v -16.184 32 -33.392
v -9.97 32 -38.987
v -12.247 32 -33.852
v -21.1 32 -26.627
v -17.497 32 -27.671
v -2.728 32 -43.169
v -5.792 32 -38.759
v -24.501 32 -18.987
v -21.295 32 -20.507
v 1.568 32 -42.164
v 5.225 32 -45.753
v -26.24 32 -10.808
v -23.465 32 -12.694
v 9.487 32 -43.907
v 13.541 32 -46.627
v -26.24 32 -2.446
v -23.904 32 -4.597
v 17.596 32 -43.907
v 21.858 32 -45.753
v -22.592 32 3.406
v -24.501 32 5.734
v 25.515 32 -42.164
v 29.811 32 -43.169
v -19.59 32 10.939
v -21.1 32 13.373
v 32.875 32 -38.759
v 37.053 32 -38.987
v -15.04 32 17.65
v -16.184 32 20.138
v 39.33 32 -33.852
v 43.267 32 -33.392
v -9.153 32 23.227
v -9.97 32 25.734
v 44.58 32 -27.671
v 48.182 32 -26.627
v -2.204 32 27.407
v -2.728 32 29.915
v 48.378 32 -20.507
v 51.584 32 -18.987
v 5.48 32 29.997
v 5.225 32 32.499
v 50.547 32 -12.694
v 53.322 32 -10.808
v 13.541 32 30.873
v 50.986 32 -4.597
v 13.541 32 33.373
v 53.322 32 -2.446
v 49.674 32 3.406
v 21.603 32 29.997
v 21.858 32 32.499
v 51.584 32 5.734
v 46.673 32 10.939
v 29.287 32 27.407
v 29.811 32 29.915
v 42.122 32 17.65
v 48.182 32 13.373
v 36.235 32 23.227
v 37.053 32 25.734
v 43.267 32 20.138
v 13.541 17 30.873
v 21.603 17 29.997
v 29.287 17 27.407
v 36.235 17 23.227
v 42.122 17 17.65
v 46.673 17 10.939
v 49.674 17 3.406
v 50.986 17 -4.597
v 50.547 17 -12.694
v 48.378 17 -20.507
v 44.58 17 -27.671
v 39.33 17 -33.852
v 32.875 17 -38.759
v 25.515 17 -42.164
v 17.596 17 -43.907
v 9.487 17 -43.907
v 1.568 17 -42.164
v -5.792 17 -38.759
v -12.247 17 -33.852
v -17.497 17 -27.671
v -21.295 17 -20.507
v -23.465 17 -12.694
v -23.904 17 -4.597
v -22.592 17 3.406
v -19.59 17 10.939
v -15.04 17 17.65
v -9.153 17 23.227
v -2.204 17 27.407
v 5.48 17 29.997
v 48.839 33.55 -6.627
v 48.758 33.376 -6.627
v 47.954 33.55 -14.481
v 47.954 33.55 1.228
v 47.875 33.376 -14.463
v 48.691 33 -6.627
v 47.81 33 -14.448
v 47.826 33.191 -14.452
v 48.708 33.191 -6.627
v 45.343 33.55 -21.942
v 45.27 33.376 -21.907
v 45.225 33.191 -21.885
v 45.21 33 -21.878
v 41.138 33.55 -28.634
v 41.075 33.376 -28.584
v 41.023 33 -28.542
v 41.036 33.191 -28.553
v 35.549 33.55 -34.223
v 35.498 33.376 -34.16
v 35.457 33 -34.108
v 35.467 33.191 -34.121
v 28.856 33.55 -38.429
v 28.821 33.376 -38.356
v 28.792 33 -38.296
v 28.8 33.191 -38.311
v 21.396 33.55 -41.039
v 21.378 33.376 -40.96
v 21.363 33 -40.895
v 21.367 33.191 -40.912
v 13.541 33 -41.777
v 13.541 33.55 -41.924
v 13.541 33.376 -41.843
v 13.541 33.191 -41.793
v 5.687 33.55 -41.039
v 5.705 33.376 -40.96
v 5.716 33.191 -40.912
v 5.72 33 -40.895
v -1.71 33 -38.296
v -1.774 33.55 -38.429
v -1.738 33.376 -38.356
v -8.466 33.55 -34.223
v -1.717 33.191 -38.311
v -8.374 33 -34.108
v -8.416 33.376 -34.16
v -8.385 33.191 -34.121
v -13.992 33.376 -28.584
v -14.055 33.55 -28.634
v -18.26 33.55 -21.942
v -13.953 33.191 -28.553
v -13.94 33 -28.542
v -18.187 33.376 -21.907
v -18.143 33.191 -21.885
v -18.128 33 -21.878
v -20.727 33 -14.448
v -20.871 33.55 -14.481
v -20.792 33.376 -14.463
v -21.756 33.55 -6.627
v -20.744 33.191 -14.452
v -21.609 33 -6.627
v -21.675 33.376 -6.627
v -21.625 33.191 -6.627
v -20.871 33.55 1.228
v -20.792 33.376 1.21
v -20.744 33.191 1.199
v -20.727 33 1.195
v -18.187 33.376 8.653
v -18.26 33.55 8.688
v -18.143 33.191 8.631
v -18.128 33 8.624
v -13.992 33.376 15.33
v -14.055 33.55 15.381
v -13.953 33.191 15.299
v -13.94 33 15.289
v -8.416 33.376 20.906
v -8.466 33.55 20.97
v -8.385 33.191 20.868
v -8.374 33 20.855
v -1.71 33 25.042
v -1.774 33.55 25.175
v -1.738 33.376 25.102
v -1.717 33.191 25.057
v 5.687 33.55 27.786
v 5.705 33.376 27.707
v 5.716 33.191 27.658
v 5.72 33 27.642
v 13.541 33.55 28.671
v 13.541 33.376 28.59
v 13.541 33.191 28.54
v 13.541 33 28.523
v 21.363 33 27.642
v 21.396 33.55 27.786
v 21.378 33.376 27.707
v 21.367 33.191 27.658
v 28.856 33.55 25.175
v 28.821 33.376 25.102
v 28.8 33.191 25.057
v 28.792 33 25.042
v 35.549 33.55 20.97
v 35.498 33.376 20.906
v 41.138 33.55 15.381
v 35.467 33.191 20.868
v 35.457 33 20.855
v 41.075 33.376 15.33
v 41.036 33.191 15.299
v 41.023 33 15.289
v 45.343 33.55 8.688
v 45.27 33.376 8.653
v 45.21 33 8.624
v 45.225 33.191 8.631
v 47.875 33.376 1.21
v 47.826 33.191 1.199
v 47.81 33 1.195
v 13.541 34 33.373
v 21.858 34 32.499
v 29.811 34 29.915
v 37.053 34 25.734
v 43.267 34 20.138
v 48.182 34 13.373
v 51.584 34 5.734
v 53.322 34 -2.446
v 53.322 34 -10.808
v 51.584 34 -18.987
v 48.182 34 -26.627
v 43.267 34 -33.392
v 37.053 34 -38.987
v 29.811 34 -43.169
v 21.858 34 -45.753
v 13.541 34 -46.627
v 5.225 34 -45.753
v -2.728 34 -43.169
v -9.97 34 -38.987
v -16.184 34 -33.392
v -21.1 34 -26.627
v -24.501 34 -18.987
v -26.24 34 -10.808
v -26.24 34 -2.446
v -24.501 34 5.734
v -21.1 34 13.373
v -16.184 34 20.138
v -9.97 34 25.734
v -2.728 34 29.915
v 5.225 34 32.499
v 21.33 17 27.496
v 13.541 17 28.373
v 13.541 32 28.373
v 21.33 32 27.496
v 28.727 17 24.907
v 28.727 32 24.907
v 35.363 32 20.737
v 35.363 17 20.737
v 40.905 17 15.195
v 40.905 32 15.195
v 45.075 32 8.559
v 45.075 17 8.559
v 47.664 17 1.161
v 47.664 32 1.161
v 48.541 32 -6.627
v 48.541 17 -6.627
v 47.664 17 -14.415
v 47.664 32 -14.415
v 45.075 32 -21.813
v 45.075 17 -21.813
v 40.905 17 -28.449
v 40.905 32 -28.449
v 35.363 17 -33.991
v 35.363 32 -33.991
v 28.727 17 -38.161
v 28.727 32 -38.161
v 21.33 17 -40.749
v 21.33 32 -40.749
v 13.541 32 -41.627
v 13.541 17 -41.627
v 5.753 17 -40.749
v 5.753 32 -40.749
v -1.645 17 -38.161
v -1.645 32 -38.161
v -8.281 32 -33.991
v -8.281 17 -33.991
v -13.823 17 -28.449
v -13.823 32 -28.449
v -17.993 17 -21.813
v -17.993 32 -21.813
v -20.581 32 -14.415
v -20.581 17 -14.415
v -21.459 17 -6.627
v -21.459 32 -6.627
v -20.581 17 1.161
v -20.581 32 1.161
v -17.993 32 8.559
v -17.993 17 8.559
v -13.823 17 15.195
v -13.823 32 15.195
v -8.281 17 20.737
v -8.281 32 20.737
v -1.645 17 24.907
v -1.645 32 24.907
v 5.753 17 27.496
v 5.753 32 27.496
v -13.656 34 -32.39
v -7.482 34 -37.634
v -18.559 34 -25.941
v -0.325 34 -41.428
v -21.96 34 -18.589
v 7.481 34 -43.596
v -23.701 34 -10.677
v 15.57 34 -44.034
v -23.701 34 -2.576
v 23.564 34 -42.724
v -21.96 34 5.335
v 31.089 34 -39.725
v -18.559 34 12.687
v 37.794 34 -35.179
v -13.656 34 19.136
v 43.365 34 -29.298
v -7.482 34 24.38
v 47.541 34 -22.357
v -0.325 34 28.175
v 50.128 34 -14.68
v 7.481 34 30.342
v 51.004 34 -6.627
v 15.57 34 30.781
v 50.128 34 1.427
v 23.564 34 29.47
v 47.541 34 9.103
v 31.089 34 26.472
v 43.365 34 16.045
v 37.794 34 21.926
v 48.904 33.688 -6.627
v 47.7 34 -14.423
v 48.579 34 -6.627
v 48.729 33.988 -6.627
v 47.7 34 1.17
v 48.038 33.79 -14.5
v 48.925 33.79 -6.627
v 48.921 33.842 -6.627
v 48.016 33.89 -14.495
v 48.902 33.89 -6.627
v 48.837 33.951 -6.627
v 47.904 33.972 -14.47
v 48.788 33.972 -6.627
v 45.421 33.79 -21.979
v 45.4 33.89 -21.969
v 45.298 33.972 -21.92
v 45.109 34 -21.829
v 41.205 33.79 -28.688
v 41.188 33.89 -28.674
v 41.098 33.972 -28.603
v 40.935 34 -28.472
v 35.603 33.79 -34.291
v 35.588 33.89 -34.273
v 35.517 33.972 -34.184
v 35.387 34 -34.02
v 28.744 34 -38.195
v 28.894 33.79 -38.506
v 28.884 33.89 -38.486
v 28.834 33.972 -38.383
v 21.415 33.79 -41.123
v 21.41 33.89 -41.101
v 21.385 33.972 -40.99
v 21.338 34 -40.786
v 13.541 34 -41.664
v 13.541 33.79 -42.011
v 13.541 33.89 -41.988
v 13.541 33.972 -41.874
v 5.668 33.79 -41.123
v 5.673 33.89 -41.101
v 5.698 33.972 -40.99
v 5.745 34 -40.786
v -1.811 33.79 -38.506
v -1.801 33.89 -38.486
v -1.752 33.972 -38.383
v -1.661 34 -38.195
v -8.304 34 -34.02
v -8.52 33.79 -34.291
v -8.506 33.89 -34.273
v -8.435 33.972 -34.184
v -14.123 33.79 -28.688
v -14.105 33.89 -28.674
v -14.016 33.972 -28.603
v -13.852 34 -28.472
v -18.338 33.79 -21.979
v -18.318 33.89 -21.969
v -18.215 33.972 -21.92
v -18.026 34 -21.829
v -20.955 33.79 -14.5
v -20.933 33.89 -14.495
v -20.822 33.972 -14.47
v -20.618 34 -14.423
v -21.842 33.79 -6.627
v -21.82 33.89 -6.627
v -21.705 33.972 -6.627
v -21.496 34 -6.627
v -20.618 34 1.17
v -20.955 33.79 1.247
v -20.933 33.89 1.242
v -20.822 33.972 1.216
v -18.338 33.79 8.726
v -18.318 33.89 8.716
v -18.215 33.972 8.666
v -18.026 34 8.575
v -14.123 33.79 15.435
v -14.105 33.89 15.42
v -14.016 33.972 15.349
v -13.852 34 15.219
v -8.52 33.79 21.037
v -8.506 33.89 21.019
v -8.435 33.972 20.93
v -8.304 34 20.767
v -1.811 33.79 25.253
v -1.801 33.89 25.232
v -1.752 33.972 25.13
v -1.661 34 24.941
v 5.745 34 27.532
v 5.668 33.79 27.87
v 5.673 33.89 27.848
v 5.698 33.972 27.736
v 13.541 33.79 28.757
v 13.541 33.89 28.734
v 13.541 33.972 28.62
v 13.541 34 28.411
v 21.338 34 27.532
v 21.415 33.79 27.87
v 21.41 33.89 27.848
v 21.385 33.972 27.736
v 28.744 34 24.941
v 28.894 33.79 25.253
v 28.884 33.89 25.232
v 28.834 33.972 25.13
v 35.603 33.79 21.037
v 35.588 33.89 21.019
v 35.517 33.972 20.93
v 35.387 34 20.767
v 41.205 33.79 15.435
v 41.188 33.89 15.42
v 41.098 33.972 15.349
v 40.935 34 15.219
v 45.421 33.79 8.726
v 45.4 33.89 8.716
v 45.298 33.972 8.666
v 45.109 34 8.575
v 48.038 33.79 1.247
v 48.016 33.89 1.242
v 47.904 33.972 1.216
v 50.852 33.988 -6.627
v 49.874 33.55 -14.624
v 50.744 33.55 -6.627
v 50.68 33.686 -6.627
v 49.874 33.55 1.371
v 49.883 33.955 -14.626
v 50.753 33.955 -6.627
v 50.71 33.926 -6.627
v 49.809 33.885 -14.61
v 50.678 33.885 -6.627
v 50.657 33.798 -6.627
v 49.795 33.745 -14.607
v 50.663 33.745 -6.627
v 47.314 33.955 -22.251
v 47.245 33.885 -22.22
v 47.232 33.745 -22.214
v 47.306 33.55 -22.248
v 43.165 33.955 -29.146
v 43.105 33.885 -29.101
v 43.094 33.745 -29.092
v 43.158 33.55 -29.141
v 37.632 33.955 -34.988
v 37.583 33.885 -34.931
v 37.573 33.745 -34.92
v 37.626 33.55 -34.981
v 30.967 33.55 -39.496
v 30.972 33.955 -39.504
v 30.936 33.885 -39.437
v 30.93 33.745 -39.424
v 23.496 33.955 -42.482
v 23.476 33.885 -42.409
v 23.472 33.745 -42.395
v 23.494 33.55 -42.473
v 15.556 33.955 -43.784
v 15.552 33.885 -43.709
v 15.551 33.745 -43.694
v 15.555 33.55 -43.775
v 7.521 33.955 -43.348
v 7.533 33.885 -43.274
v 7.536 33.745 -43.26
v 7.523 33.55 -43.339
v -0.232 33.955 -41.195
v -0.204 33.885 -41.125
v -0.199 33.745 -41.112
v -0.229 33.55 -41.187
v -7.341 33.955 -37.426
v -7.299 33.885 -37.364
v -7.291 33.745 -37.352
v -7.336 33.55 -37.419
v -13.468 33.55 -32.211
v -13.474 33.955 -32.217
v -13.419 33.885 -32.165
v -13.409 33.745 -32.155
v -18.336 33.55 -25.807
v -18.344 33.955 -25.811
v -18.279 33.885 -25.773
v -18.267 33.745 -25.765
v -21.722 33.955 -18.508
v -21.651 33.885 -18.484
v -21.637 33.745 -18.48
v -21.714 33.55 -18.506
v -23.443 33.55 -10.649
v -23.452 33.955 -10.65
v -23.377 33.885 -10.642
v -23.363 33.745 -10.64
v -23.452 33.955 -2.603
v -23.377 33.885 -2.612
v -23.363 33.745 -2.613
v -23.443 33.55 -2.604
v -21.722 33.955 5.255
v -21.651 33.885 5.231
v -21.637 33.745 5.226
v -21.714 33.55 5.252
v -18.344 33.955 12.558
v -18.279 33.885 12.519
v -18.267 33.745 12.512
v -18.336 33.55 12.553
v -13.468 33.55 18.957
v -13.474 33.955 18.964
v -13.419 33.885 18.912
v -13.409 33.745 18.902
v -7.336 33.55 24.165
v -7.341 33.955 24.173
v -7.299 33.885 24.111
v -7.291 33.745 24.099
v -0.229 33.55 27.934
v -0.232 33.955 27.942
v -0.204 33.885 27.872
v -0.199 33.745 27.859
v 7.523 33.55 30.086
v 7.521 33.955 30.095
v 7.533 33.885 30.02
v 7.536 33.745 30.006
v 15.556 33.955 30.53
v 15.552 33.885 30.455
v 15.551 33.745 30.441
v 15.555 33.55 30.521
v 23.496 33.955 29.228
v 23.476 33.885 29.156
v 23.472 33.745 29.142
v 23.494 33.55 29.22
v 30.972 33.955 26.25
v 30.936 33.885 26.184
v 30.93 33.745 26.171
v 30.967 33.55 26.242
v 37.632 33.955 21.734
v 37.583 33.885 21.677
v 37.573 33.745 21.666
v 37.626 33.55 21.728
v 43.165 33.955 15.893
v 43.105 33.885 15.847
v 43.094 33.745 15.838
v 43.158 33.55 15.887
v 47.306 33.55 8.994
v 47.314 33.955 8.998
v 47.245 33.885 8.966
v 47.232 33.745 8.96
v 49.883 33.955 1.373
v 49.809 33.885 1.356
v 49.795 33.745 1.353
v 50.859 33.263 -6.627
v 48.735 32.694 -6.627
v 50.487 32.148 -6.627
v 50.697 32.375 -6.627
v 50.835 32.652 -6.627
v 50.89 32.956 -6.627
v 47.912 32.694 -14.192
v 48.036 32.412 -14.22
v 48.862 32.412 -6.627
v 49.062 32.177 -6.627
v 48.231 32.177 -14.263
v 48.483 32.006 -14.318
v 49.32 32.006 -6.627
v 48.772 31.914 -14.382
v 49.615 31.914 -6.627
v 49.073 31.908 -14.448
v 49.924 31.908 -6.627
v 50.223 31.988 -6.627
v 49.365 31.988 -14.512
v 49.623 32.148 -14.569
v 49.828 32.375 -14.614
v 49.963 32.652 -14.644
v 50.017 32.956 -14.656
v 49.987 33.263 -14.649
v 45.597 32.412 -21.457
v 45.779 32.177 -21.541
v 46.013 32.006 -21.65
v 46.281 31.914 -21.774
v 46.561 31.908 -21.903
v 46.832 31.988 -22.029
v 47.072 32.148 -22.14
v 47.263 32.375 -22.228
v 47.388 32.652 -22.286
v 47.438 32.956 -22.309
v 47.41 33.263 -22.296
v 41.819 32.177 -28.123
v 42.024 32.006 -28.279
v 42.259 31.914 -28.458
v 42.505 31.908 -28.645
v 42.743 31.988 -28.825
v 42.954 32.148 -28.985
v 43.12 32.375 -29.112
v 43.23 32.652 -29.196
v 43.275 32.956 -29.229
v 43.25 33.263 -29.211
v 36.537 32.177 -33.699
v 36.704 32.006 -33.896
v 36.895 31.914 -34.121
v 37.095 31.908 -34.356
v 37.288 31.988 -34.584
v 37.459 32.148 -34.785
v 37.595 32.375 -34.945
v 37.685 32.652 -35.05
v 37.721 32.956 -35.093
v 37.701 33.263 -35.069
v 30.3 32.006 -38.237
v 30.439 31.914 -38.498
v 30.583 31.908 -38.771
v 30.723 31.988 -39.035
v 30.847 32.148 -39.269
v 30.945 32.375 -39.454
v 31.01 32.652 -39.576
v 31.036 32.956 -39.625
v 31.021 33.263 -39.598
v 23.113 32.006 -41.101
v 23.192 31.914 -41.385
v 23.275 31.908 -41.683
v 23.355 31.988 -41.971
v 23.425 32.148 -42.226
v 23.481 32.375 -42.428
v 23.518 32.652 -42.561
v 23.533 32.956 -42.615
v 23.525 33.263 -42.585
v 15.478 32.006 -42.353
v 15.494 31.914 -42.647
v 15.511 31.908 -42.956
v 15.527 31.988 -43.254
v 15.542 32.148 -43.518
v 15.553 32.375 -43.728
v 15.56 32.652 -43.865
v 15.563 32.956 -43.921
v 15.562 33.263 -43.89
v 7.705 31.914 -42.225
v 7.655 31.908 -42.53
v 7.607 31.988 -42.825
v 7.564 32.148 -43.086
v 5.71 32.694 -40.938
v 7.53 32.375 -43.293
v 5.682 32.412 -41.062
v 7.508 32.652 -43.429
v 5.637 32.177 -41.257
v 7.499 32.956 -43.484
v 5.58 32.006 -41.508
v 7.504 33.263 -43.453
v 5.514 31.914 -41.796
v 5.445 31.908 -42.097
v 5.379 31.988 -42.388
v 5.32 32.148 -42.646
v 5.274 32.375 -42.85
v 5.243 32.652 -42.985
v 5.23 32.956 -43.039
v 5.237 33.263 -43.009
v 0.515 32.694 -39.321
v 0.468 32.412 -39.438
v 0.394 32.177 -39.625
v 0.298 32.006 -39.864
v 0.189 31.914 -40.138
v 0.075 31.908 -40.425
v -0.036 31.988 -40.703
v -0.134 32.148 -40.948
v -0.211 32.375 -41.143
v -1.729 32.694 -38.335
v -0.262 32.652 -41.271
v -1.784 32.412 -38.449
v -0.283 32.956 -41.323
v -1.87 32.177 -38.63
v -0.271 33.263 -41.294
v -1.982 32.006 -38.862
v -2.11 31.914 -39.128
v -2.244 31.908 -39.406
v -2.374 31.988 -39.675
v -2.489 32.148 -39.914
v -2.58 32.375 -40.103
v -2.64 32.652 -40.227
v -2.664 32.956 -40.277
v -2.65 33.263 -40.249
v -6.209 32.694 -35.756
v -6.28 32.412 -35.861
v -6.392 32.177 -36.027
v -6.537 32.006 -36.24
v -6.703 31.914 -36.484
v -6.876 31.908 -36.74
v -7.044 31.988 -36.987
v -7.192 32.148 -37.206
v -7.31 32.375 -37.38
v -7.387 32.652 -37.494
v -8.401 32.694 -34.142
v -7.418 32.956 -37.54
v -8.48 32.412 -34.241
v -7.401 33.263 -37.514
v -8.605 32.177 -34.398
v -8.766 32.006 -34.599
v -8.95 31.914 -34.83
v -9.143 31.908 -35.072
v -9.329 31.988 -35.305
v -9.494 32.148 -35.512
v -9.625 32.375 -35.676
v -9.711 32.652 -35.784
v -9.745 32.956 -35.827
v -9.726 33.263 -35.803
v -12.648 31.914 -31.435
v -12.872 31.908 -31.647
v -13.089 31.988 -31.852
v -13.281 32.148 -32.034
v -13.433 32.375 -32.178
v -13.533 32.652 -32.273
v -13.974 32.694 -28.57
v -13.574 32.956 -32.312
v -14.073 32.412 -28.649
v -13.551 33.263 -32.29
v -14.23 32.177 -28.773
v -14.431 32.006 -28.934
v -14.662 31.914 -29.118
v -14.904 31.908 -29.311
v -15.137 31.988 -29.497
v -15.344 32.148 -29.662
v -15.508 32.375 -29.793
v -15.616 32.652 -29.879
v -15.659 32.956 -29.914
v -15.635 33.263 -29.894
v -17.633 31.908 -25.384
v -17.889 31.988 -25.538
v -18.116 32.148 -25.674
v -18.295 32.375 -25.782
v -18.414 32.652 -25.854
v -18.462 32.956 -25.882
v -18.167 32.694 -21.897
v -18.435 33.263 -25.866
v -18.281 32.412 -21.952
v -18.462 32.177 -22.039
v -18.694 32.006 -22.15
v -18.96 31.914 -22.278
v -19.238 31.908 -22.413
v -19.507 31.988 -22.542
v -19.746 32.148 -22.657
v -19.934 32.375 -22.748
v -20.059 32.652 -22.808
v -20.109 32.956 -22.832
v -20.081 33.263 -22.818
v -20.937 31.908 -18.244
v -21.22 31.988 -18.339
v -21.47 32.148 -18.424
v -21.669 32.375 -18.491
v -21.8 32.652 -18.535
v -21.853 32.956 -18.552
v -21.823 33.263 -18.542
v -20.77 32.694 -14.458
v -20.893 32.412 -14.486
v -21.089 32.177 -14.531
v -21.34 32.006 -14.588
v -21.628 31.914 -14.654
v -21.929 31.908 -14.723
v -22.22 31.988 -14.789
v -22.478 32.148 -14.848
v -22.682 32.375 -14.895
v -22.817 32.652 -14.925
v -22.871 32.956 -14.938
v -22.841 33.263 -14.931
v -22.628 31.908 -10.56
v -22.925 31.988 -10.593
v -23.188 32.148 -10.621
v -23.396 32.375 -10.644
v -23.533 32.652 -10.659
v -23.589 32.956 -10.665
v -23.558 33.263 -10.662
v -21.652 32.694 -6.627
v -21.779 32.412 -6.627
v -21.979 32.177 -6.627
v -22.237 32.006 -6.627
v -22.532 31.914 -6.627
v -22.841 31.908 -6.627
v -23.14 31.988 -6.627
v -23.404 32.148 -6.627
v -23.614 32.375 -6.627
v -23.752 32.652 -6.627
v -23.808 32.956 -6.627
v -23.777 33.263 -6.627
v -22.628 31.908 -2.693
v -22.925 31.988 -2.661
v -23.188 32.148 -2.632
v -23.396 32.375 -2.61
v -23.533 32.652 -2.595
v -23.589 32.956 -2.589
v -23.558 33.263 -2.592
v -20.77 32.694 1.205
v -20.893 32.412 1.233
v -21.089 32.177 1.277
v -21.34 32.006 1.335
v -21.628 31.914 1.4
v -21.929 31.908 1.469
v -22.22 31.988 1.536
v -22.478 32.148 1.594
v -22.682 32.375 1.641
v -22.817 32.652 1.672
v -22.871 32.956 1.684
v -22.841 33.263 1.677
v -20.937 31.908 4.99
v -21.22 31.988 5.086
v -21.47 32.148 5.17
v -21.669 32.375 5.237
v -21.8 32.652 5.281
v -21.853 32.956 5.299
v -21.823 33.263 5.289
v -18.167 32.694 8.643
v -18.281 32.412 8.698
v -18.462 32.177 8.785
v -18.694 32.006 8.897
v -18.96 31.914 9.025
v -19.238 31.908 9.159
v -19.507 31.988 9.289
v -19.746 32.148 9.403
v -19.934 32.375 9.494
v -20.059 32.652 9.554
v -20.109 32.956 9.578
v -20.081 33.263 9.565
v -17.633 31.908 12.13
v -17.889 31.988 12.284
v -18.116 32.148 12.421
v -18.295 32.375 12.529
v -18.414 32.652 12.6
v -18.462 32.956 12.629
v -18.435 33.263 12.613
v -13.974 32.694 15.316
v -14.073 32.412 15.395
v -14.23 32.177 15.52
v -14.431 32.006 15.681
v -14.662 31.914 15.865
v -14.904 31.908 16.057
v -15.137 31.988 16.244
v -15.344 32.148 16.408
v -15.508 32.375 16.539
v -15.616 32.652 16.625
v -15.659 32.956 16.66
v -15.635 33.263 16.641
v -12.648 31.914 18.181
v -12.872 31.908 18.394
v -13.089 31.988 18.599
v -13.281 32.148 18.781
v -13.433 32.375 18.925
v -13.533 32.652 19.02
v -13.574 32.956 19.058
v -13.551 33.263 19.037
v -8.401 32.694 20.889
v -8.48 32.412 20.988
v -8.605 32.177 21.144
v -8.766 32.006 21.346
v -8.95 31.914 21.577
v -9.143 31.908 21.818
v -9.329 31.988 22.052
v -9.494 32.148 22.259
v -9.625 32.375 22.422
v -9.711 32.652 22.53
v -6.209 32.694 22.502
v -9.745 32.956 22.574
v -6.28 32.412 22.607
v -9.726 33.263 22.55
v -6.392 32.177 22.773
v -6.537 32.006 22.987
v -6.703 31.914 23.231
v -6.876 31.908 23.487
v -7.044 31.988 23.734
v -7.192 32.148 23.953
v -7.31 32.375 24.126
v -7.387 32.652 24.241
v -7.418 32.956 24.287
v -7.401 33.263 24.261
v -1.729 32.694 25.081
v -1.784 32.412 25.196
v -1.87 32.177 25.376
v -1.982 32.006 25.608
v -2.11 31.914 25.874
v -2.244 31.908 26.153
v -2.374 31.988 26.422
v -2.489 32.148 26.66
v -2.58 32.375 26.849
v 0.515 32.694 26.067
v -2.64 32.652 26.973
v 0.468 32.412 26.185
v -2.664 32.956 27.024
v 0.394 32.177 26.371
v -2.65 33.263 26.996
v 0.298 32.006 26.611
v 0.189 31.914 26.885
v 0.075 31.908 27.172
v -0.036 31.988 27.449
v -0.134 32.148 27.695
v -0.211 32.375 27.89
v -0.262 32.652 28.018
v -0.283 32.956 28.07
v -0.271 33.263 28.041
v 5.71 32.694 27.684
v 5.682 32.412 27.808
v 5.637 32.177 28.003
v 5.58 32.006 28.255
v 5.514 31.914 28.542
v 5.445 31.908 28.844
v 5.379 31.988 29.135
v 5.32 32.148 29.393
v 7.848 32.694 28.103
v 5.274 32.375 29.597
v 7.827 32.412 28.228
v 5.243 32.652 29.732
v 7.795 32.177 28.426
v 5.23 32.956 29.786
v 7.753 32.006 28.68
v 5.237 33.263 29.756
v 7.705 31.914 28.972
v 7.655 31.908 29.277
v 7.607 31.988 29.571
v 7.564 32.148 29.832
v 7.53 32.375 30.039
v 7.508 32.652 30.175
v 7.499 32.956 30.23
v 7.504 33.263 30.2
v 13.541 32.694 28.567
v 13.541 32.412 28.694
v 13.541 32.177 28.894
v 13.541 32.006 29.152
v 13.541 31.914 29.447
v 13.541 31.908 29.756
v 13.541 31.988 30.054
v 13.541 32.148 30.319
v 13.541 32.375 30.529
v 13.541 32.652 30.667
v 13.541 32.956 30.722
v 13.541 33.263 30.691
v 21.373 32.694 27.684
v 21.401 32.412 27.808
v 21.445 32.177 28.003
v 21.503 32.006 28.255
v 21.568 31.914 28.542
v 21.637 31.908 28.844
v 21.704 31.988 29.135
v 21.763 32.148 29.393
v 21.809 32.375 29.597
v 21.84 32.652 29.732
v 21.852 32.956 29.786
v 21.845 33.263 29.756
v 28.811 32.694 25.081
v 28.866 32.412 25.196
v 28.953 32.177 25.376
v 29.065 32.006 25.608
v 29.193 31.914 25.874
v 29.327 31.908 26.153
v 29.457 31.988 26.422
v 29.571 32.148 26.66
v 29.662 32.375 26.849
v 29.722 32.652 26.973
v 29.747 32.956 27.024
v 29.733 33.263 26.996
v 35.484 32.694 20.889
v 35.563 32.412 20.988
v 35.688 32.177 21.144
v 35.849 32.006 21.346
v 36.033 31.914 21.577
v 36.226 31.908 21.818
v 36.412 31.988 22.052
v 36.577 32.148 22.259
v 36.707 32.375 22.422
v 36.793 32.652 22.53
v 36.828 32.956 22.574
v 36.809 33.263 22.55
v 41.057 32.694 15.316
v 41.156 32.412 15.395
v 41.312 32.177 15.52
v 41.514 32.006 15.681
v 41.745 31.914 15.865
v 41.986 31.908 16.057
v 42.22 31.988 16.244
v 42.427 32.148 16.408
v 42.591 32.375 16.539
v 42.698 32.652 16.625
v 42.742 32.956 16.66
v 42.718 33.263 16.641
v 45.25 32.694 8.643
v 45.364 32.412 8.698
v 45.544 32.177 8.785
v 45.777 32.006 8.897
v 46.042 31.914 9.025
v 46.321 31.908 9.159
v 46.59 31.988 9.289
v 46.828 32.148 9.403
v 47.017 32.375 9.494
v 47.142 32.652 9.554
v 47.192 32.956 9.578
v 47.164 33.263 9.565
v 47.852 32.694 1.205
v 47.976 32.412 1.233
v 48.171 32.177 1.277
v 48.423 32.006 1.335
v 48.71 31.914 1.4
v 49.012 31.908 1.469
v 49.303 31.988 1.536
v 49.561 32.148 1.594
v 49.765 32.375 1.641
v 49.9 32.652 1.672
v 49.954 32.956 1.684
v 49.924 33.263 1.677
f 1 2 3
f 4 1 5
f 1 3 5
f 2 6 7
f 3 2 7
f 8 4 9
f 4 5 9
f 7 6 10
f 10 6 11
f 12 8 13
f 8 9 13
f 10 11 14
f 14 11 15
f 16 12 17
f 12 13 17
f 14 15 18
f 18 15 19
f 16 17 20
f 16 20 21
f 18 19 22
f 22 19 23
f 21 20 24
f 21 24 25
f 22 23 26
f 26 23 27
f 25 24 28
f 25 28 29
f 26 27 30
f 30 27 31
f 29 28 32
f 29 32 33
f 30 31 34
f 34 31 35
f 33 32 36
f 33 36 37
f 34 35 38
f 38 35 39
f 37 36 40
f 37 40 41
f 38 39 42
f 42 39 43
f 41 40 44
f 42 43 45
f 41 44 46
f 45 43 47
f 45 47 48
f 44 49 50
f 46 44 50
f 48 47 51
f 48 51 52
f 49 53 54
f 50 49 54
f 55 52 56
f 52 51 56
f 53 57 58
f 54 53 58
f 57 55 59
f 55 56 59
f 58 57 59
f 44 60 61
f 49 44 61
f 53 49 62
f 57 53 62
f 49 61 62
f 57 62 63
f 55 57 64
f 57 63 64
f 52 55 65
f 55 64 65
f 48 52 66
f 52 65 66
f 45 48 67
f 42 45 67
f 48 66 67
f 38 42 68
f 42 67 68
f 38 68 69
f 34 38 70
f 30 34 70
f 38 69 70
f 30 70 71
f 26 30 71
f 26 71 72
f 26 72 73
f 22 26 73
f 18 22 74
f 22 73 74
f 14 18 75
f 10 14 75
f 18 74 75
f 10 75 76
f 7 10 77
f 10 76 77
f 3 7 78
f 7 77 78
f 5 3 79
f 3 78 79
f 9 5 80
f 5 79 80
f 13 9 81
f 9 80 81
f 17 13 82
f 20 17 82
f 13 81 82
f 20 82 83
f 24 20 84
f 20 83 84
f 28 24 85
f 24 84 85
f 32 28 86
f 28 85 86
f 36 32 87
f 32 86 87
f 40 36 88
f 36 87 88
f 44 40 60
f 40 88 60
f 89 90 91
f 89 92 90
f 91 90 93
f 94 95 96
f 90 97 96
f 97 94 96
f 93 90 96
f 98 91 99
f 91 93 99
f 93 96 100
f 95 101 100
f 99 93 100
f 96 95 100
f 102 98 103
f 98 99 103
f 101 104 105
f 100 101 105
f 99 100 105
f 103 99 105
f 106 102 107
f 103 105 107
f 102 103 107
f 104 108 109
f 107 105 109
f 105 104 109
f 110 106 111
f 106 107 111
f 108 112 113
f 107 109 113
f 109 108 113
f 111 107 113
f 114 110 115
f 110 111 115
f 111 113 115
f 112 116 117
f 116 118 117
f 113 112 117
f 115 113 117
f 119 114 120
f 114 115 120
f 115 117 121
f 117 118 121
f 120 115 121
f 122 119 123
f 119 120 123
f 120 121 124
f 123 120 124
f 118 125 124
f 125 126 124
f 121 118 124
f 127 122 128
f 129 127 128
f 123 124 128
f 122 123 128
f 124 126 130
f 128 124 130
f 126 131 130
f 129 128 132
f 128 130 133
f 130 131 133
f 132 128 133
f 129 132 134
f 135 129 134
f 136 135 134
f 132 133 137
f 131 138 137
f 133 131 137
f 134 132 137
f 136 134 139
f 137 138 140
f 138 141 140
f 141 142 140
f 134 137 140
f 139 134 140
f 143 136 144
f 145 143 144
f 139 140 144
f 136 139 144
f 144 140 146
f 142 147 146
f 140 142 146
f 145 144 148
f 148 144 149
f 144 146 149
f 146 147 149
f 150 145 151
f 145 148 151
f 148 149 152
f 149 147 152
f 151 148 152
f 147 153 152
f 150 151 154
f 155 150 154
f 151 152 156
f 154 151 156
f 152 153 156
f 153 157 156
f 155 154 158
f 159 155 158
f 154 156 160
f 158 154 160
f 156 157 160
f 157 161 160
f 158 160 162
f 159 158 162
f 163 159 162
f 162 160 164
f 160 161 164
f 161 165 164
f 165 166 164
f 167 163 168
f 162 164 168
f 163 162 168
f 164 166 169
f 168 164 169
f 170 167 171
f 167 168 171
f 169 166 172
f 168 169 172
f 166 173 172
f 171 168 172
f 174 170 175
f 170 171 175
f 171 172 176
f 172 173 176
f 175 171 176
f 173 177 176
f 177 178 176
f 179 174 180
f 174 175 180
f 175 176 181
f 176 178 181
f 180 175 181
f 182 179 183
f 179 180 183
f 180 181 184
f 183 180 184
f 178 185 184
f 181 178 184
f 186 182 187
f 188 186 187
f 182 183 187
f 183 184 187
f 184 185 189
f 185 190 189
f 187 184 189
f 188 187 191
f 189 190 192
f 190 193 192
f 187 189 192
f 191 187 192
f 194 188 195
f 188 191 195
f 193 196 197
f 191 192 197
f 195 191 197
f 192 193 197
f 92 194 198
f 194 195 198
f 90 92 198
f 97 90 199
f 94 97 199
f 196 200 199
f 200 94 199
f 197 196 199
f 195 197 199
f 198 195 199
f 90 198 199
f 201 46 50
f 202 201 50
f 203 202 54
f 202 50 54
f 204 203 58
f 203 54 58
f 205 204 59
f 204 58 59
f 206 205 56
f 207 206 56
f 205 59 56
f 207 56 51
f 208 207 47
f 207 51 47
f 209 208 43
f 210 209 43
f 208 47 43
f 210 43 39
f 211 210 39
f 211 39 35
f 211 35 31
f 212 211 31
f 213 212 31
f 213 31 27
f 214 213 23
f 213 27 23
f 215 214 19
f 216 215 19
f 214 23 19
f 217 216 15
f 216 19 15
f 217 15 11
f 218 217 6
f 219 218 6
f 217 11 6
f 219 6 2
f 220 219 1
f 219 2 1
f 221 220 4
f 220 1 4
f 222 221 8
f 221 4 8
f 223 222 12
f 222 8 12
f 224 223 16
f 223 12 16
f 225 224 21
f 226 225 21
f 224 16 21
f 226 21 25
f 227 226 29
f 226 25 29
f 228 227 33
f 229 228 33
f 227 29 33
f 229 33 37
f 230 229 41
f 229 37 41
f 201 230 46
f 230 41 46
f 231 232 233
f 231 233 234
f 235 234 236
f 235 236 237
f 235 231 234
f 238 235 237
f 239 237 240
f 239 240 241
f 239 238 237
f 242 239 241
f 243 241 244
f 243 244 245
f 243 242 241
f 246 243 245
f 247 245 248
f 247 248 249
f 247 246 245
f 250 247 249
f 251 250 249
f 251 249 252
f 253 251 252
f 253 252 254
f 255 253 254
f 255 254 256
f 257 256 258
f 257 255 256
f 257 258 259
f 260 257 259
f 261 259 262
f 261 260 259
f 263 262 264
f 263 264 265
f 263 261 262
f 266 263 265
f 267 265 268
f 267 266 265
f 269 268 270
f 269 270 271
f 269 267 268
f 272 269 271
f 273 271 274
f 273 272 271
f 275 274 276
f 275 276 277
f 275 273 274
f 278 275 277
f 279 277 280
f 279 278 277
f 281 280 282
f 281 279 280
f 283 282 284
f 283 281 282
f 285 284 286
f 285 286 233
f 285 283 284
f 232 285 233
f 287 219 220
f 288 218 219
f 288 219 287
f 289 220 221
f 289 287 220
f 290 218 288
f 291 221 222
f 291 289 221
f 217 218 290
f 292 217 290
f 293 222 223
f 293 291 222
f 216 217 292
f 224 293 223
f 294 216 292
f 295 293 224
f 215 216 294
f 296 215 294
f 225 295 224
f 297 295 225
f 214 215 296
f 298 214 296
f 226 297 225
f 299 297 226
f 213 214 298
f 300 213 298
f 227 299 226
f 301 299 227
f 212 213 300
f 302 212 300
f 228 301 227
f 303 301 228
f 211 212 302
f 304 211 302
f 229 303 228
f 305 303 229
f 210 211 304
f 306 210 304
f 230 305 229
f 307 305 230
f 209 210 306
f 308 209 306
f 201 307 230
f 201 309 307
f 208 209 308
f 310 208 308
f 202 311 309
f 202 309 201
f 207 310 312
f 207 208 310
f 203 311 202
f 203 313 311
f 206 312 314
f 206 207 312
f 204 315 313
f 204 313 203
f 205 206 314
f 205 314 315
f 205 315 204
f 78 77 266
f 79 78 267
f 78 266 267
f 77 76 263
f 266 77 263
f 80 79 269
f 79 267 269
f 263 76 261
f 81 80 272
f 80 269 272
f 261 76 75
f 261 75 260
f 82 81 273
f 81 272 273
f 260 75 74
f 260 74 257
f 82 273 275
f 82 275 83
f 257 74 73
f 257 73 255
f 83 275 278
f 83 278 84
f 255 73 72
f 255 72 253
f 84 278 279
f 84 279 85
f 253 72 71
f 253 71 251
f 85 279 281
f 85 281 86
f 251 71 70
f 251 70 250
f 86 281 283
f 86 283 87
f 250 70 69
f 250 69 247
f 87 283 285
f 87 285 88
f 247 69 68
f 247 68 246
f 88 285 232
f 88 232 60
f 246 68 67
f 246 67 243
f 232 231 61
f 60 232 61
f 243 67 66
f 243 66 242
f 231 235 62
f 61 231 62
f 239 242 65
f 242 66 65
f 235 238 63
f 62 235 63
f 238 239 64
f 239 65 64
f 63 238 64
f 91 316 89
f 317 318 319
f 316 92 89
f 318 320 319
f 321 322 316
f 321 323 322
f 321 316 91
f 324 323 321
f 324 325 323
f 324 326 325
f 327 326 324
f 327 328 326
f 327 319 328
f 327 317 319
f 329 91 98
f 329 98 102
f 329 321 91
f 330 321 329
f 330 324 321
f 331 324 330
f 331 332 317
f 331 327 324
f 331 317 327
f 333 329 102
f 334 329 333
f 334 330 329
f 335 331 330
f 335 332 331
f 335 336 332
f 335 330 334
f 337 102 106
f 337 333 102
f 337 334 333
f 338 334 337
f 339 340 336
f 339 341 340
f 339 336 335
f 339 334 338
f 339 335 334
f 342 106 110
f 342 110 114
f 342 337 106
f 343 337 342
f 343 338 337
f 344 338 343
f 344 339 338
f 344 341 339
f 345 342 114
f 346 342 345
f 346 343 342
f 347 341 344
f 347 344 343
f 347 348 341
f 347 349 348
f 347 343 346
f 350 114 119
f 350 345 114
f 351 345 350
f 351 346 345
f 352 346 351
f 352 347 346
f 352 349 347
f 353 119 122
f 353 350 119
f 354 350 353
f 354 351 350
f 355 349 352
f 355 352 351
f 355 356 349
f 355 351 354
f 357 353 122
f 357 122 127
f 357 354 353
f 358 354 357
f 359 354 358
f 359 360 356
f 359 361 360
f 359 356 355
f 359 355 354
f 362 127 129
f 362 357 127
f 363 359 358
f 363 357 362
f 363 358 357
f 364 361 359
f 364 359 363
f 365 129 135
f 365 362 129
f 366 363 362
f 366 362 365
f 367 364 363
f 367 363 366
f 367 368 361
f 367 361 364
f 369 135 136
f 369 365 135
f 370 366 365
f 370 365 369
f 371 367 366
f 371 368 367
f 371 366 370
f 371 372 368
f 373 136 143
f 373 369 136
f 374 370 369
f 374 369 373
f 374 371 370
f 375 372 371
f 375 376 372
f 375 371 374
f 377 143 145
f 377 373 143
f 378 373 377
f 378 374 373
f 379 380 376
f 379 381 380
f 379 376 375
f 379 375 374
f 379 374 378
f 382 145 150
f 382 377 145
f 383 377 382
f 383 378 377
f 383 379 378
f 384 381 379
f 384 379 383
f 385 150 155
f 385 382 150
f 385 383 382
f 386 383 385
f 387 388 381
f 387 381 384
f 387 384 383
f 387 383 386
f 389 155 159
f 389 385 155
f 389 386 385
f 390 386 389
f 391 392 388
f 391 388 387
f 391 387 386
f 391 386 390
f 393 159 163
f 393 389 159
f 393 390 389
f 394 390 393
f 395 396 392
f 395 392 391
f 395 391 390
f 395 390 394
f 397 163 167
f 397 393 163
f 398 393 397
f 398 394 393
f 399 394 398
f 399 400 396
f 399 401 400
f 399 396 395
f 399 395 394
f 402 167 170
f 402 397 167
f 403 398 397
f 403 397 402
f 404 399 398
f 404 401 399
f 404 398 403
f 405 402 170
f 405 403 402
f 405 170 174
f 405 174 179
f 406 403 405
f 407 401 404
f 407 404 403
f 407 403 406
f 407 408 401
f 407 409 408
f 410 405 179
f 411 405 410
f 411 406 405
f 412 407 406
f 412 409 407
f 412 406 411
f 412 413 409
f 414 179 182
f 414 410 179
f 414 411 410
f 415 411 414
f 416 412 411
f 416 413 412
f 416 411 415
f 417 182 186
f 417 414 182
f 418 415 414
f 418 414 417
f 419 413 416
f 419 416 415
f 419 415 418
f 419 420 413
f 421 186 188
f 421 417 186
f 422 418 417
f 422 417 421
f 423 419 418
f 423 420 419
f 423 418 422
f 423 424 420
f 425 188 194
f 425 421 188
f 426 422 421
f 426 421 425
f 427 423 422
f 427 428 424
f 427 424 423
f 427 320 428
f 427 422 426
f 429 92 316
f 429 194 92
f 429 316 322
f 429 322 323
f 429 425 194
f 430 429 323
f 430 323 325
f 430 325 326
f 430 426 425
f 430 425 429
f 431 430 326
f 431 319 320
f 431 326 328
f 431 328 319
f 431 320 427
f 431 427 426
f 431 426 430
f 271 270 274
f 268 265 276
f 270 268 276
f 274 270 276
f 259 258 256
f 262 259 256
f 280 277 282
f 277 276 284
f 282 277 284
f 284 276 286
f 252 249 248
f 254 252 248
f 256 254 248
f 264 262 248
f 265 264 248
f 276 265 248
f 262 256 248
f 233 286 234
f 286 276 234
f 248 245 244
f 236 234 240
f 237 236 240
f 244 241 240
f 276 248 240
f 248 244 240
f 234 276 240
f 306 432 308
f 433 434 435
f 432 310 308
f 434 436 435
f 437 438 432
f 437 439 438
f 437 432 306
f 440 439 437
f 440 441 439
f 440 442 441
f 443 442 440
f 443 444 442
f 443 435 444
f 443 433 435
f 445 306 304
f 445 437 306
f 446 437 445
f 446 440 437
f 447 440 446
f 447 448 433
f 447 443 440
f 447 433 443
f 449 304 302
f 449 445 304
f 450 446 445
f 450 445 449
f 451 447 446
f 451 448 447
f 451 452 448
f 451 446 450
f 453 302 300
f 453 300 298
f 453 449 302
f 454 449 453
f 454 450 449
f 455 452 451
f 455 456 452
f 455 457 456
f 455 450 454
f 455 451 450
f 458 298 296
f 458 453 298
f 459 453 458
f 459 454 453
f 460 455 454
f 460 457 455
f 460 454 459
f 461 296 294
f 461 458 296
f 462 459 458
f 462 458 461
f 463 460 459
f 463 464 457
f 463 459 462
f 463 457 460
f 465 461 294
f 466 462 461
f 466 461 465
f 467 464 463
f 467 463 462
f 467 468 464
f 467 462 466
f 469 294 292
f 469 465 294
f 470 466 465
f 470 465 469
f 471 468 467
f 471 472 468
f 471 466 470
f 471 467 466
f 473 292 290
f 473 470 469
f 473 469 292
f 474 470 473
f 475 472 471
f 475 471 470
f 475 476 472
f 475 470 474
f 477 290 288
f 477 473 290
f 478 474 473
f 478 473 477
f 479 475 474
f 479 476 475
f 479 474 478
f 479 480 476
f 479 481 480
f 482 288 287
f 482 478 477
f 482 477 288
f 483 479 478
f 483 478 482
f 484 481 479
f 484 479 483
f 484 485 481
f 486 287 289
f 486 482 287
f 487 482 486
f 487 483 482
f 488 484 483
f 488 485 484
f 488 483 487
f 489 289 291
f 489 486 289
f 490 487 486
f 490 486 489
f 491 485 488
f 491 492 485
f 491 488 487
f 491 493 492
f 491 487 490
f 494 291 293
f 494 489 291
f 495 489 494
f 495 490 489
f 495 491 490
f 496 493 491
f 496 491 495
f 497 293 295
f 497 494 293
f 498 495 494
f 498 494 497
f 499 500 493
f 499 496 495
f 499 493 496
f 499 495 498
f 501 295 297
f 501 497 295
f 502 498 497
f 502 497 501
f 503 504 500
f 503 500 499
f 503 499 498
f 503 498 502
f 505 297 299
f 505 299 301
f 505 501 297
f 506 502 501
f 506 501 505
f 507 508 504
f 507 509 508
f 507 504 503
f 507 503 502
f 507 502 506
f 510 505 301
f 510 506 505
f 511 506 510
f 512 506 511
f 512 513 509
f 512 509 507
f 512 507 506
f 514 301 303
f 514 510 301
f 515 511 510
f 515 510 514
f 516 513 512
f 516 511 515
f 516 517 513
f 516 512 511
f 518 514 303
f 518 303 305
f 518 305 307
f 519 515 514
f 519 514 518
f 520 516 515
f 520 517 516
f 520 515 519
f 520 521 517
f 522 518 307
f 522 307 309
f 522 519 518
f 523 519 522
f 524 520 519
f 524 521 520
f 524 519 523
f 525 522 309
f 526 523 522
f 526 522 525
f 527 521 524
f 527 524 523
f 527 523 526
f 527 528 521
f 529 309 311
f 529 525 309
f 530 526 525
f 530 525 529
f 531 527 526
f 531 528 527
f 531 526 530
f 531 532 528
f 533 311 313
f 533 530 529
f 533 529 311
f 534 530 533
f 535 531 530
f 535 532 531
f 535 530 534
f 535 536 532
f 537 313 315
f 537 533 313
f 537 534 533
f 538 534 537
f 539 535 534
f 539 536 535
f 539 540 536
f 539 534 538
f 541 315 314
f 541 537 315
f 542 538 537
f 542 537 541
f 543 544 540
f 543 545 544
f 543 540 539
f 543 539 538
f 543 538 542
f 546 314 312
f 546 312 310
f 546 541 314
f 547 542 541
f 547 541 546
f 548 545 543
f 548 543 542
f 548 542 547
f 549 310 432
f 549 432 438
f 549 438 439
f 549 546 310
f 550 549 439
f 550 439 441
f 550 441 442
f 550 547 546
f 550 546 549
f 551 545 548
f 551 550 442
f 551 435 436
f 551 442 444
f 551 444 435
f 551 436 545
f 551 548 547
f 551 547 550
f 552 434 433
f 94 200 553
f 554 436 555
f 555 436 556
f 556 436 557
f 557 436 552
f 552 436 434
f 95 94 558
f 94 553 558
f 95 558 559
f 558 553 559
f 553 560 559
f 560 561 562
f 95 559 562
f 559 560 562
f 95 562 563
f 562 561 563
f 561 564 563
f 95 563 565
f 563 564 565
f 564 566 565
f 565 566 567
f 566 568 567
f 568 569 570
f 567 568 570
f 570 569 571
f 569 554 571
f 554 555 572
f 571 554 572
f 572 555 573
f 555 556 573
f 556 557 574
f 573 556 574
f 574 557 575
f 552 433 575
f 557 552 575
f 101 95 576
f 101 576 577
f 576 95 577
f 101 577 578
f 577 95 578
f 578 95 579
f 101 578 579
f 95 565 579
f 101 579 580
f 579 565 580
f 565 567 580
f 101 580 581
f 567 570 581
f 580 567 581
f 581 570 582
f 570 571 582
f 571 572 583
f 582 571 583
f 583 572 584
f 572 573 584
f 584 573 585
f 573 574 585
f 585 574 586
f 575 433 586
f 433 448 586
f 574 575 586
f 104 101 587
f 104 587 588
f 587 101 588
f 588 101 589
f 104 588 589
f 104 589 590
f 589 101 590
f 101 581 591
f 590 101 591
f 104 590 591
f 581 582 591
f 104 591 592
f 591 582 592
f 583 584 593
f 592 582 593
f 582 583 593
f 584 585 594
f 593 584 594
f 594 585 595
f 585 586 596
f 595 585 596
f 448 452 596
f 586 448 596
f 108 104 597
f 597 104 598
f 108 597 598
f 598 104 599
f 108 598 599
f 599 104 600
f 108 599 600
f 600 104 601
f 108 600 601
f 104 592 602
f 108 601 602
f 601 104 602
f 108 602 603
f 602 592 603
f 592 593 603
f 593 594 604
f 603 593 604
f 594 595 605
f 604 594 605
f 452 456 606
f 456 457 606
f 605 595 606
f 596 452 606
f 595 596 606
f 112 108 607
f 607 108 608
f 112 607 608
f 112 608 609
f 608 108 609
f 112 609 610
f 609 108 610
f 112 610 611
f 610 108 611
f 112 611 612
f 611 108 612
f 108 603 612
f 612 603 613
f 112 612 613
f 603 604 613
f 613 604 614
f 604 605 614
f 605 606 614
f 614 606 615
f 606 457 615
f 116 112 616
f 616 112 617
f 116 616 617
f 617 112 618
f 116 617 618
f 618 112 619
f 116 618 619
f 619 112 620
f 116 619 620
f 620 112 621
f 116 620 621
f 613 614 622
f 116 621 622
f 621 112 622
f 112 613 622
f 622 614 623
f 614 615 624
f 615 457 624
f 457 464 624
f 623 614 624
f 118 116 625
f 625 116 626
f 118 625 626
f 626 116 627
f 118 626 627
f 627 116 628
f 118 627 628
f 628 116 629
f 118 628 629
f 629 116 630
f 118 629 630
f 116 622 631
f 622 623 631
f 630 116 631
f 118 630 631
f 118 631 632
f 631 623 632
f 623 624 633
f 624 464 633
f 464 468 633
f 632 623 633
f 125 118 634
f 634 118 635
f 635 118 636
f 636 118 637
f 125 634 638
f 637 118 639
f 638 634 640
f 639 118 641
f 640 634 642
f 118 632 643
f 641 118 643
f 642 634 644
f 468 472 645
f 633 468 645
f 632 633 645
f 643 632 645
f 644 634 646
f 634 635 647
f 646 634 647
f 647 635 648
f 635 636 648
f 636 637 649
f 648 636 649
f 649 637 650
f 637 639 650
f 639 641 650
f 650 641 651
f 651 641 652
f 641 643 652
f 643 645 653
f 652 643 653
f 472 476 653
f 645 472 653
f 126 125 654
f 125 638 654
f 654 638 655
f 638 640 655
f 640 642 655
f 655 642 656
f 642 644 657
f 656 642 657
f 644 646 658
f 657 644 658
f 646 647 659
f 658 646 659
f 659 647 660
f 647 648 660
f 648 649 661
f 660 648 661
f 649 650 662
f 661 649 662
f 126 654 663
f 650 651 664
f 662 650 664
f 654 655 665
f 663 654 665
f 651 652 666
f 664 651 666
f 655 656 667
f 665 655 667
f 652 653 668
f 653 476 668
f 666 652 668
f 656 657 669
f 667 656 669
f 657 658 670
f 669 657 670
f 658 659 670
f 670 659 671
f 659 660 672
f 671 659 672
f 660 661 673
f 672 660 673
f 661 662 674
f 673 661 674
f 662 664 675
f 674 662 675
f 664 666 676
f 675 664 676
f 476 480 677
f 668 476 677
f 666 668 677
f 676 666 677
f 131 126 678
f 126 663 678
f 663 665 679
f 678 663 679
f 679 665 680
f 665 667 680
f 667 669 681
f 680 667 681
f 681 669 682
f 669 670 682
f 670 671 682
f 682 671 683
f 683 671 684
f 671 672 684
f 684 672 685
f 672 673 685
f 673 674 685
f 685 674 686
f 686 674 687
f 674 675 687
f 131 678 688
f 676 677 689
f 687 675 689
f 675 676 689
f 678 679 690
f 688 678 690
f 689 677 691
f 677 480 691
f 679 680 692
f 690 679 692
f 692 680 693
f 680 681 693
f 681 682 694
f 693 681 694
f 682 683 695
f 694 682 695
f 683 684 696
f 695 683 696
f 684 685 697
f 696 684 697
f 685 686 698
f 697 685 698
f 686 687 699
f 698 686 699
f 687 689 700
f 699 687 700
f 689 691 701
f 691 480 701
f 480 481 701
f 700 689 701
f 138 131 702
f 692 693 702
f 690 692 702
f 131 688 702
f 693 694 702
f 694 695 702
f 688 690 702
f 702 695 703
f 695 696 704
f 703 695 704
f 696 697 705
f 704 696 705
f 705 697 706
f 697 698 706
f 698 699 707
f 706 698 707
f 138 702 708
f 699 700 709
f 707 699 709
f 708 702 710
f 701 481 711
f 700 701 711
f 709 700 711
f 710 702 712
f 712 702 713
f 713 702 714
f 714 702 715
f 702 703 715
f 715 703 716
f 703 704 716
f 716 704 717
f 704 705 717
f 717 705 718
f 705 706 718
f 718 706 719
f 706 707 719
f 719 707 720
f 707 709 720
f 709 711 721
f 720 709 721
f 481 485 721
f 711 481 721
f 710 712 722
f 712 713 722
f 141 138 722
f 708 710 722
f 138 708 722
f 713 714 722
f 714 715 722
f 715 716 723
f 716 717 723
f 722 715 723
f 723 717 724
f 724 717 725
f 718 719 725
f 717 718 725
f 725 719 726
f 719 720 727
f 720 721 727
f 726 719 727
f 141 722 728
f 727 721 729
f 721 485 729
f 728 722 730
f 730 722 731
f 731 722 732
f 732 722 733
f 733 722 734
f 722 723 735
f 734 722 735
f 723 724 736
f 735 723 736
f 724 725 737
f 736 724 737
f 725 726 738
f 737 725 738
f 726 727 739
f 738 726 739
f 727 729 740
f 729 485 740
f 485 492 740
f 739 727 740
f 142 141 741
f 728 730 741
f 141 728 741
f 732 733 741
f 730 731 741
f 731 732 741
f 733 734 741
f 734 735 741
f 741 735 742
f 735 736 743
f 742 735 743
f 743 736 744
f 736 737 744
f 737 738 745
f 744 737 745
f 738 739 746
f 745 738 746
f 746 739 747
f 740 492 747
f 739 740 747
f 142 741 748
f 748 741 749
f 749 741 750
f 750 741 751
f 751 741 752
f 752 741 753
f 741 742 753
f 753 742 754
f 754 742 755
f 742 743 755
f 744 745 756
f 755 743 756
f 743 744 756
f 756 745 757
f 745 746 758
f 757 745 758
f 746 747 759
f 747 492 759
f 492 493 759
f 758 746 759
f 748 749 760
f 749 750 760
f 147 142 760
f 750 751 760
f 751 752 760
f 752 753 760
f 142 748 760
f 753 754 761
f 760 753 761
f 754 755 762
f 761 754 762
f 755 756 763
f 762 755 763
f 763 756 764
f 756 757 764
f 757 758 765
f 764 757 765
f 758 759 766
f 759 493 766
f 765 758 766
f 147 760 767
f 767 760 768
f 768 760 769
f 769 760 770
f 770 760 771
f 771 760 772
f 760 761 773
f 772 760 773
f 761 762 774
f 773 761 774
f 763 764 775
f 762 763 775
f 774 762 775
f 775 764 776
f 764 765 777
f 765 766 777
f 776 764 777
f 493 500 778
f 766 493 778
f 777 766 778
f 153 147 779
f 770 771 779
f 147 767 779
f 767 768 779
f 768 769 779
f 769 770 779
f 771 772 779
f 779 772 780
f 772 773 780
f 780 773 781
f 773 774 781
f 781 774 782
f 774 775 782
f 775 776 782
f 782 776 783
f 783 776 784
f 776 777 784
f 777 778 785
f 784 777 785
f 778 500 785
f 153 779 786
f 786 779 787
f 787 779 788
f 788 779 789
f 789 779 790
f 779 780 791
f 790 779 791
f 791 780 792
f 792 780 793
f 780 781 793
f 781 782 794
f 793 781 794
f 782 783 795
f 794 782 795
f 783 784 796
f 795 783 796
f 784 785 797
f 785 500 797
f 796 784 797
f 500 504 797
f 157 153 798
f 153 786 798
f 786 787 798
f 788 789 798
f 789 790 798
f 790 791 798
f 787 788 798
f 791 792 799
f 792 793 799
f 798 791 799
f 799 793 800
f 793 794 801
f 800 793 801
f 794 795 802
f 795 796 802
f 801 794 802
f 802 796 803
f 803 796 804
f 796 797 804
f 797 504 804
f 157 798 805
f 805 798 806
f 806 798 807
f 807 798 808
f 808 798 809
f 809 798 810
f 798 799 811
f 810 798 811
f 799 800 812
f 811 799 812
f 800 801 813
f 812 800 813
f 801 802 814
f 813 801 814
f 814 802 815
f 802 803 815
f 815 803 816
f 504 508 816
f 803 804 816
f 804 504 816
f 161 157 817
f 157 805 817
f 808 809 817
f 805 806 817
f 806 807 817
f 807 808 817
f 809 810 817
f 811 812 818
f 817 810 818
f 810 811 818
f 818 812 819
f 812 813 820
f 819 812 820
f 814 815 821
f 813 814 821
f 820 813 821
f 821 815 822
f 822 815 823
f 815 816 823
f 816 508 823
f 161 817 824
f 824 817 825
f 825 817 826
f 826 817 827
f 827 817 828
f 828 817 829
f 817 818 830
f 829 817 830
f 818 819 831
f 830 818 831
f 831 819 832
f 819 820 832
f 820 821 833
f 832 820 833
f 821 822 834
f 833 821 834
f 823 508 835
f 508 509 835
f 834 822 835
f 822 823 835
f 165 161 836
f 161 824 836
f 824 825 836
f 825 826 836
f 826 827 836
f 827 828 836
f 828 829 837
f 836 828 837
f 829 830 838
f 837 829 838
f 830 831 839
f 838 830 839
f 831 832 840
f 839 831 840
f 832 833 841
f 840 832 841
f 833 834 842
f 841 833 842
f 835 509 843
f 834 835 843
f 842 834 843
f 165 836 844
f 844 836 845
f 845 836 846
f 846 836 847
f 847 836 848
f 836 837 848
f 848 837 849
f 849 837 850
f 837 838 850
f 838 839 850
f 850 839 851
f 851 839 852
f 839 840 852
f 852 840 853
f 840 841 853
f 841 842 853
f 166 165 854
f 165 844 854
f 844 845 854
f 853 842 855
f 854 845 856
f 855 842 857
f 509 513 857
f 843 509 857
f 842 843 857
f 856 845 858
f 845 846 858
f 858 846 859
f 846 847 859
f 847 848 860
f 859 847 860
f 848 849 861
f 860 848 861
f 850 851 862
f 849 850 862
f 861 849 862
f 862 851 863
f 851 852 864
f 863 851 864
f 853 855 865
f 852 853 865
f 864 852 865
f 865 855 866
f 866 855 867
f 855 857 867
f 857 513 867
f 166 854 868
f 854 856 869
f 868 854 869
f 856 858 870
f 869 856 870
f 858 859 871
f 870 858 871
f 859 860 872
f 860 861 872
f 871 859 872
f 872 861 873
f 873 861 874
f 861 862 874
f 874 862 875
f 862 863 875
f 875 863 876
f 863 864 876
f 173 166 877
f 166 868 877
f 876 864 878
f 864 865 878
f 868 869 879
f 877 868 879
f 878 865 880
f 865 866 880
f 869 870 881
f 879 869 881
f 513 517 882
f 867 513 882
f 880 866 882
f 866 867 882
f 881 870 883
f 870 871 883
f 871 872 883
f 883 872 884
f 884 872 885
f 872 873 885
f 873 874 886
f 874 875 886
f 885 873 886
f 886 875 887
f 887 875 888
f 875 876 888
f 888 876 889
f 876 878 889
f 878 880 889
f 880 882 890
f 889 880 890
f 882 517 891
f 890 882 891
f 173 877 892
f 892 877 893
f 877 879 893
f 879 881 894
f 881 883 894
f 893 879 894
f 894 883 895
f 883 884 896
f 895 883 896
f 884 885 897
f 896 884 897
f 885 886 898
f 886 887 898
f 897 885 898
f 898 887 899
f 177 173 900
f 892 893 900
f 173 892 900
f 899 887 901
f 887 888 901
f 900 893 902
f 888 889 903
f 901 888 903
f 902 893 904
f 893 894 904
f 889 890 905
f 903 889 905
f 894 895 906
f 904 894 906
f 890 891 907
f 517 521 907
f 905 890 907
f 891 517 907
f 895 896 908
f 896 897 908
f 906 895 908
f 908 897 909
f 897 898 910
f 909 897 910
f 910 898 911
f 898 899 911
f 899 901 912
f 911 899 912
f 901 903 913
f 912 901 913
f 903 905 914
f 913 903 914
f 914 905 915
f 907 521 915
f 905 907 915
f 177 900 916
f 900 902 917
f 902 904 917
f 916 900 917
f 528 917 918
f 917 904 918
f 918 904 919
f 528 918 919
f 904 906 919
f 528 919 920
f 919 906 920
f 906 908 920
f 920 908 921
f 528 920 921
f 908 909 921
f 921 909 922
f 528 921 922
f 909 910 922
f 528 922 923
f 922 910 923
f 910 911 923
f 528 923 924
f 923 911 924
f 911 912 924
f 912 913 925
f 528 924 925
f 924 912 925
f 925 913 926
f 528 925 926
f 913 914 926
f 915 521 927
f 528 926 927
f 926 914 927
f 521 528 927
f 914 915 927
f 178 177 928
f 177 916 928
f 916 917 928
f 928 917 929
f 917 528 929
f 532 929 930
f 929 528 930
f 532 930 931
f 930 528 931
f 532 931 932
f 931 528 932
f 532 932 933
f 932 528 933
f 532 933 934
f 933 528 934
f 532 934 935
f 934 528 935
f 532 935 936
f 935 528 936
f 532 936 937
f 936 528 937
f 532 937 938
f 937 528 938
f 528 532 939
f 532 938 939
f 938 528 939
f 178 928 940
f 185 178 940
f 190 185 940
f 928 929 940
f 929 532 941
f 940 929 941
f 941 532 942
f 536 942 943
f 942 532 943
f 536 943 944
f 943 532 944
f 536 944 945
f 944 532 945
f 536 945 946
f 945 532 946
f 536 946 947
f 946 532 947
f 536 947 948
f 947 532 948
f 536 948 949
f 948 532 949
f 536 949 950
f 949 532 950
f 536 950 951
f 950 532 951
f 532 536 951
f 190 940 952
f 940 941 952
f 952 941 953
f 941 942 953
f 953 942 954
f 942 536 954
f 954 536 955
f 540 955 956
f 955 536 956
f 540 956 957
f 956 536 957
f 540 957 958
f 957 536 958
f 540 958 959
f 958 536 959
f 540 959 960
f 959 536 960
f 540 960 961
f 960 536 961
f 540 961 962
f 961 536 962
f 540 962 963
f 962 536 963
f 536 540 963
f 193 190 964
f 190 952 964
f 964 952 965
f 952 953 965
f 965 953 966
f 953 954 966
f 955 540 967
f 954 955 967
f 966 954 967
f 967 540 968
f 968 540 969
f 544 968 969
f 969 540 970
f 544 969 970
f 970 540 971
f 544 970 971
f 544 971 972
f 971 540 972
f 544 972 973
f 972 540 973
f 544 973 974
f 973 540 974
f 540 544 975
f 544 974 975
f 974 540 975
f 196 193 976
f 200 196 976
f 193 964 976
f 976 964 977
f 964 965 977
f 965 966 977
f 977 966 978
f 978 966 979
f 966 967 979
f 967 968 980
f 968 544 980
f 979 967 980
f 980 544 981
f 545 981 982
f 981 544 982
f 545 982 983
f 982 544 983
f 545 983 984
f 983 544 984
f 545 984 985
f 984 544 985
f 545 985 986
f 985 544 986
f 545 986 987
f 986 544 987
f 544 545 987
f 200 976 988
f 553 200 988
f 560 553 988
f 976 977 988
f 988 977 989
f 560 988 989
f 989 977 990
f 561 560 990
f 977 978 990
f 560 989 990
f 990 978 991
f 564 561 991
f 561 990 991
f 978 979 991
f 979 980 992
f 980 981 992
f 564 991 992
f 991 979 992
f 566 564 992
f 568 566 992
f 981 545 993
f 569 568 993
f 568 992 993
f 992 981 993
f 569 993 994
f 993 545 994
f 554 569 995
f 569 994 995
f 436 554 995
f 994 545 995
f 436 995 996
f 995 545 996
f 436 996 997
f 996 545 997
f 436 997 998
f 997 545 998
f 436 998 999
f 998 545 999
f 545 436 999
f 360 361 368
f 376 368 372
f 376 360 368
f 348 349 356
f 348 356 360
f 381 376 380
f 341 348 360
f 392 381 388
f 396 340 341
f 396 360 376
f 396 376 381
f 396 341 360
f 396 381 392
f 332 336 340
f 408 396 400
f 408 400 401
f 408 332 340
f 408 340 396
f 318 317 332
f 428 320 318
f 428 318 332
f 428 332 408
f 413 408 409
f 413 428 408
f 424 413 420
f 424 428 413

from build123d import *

# Parameters (mm, degrees)
CROQUIS1_R              = 37.5
CROQUIS1_R_2            = 35
SALIENTE_EXTRUIR1_DEPTH = 15
CROQUIS2_R              = 40
SALIENTE_EXTRUIR2_DEPTH = 2
CROQUIS5_R              = 1.1


with BuildPart() as part:
    # Croquis1 → Saliente-Extruir1 (new body)
    with BuildSketch(Plane(origin=(0, 17, 0), x_dir=(1, 0, 0), z_dir=(0, 1, 0))):
        with Locations(Location((13.541348433, 6.626768313, 0), (0, 0, 270))):
            Circle(CROQUIS1_R)
        with Locations(Location((13.541348433, 6.626768313, 0), (0, 0, 270))):
            Circle(CROQUIS1_R_2, mode=Mode.SUBTRACT)
    extrude(amount=SALIENTE_EXTRUIR1_DEPTH)

    # Croquis2 → Saliente-Extruir2 (add)
    with BuildSketch(Plane(origin=(0, 32, 0), x_dir=(1, 0, 0), z_dir=(0, 1, 0))):
        with Locations(Location((13.541348433, 6.626768313, 0), (0, 0, 270))):
            Circle(CROQUIS2_R)
    extrude(amount=SALIENTE_EXTRUIR2_DEPTH)

    # Cortar-Barrer1: sweep along a path in Croquis6
    with BuildLine(Plane(origin=(0, 33, 0), x_dir=(1, 0, 0), z_dir=(0, 1, 0))) as cortar_barrer1_path:
        CenterArc((13.541348433, 6.626768313), 36.25, 0, 360)
    # Croquis5 → Cortar-Barrer1 (sweep, cut)
    with BuildSketch(Plane.XY.offset(-6.626768313)):
        with Locations((-22.708651567, 33)):
            Circle(CROQUIS5_R)
    sweep(path=cortar_barrer1_path.line, mode=Mode.SUBTRACT)

    # Redondeo1
    # a fillet whose section is not a circle: 0.3 mm, written as the material it takes off along each edge
    with BuildSketch(Plane(origin=(13.541348433, 34, -6.626768313), x_dir=(1, 0, 0), z_dir=(0, 0, 1))) as redondeo1_piece_1:
        with BuildLine():
            Bezier((37.462435565, 0), (36.942820323, 0), (37.202627944, -0.45), weights=[1, 1, 1])
            ThreePointArc((37.202627944, -0.45), (36.990455592, -0.186534871), (36.708257569, 0))
            Line((36.708257569, 0), (37.462435565, 0))
        make_face()
    revolve(axis=Axis((13.541348433, 34, -6.626768313), (0, 1, 0)), mode=Mode.SUBTRACT)
    with BuildSketch(Plane(origin=(13.541348433, 34, -6.626768313), x_dir=(1, 0, 0), z_dir=(0, 0, 1))) as redondeo1_piece_2:
        with BuildLine():
            Bezier((35.297372056, -0.45), (35.557179677, 0), (35.037564435, 0), weights=[1, 1, 1])
            Line((35.037564435, 0), (35.791742431, 0))
            ThreePointArc((35.791742431, 0), (35.509544408, -0.186534871), (35.297372056, -0.45))
        make_face()
    revolve(axis=Axis((13.541348433, 34, -6.626768313), (0, 1, 0)), mode=Mode.SUBTRACT)


solid = part.part
